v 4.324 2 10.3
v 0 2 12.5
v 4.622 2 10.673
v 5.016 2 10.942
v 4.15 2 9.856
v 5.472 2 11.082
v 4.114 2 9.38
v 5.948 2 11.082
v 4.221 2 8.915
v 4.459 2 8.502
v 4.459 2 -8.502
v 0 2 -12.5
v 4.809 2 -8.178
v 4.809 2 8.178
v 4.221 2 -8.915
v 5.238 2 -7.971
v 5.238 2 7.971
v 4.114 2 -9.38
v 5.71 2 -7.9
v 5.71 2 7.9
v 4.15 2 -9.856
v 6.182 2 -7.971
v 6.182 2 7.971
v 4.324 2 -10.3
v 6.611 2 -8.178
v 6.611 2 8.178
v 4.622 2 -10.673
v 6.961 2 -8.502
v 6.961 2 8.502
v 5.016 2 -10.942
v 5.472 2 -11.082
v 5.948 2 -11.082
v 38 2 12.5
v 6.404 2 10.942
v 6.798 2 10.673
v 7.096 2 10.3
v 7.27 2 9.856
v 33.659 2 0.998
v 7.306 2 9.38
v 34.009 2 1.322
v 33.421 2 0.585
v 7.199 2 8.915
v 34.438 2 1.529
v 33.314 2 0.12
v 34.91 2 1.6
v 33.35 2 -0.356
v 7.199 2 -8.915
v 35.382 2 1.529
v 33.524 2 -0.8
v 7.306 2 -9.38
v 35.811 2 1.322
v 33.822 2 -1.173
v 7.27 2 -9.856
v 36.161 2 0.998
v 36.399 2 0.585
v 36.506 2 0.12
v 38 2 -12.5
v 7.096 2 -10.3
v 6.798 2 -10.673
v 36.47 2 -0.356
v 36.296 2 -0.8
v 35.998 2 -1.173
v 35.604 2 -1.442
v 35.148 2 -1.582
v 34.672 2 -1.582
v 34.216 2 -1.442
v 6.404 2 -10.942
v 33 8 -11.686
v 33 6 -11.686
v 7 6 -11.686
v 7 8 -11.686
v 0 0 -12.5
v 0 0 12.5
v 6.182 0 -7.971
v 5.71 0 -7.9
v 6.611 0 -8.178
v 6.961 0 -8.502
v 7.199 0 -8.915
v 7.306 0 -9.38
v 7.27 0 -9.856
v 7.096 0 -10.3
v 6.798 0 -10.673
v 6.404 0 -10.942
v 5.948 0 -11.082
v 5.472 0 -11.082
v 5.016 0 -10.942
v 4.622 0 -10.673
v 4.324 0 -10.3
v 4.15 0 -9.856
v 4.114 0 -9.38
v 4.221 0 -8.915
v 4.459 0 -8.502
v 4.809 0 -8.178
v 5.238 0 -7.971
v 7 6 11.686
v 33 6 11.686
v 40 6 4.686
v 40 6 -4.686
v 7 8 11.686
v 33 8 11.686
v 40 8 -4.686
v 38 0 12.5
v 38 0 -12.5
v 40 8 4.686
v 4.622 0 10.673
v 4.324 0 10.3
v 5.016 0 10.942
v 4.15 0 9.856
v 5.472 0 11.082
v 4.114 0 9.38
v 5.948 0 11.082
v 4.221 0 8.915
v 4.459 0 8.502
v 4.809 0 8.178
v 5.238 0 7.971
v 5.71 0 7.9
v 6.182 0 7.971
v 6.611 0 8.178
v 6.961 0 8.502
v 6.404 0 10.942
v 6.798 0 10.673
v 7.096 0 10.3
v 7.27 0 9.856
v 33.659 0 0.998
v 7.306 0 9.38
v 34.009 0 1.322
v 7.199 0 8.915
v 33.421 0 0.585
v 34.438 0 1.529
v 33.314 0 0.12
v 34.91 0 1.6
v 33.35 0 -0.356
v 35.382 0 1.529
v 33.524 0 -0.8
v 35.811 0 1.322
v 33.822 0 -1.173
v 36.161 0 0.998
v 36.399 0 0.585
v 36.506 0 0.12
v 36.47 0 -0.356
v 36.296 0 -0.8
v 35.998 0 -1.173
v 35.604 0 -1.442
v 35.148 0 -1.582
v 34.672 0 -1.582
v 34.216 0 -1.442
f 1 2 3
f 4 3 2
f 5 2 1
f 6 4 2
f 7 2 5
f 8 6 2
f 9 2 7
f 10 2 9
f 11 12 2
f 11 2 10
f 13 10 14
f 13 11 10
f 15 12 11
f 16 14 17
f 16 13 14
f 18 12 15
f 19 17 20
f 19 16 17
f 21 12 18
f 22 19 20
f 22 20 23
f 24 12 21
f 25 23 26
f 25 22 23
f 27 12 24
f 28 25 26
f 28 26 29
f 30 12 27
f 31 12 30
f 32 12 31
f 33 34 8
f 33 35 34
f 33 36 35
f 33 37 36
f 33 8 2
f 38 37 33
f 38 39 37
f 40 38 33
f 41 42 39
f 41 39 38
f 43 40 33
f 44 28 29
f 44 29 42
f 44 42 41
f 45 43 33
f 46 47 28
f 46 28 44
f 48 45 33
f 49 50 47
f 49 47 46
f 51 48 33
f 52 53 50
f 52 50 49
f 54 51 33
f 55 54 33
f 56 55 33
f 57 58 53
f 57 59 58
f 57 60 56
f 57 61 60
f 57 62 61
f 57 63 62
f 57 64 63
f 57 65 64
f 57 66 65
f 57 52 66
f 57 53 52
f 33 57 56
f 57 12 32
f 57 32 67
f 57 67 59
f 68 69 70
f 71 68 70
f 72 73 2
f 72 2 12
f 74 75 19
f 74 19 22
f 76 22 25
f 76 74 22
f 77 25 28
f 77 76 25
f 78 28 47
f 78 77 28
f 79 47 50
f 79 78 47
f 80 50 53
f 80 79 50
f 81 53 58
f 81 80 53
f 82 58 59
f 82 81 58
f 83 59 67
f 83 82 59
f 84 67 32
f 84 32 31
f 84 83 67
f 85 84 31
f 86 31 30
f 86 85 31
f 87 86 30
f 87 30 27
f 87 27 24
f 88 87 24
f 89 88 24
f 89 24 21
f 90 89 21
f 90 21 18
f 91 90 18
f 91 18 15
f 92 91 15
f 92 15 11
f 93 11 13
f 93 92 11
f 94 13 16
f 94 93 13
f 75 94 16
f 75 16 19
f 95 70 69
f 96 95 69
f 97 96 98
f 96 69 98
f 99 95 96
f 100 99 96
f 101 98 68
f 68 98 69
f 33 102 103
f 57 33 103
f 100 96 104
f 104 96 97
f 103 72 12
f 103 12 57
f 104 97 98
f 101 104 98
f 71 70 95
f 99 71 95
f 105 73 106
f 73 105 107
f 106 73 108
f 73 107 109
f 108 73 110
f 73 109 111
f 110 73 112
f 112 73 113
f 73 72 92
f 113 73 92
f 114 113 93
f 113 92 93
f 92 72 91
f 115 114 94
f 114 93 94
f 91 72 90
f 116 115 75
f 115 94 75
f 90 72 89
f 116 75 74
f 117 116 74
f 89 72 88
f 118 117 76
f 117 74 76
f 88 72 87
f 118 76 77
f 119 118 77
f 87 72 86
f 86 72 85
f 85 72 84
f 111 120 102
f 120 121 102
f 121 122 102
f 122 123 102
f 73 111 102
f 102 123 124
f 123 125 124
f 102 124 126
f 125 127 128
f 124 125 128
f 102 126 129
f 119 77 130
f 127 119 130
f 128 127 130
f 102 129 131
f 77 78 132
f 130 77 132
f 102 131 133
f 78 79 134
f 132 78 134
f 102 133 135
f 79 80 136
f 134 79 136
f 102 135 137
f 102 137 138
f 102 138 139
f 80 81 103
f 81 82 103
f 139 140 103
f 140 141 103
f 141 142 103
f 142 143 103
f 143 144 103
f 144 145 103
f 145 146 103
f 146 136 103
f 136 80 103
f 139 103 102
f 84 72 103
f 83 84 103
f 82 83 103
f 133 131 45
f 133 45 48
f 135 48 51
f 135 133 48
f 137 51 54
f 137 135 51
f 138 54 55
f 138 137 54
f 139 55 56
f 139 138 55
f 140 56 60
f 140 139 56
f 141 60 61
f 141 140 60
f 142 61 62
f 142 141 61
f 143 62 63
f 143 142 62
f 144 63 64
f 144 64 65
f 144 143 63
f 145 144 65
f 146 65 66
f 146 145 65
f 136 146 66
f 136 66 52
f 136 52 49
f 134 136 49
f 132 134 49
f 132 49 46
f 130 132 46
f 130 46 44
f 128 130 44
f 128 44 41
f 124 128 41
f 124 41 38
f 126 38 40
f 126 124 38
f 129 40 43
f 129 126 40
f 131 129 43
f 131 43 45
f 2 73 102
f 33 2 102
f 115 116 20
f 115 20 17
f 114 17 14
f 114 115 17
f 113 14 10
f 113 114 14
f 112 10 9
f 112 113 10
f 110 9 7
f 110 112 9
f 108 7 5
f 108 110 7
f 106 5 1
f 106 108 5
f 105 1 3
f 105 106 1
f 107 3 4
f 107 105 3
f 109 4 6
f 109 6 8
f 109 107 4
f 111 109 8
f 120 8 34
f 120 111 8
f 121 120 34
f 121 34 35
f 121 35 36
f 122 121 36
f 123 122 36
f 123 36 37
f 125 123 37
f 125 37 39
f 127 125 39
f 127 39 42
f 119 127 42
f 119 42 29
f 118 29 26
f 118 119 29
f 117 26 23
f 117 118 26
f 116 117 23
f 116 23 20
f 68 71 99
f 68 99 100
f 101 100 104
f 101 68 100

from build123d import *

# Parameters (mm, degrees)
SKETCH1_W           = 38
SKETCH1_H           = 25
SKETCH1_R           = 1.6
BOSS_EXTRUDE1_DEPTH = 2
BOSS_EXTRUDE2_START = 6
BOSS_EXTRUDE2_DEPTH = 2


with BuildPart() as part:
    # Sketch1 → Boss-Extrude1 (new body)
    with BuildSketch(Plane(origin=(0, 0, 0), x_dir=(1, 0, 0), z_dir=(0, 1, 0))):
        with Locations((19, 0)):
            Rectangle(SKETCH1_W, SKETCH1_H)
        with Locations(Location((5.71, 9.5, 0), (0, 0, 270))):
            Circle(SKETCH1_R, mode=Mode.SUBTRACT)
        with Locations(Location((5.71, -9.5, 0), (0, 0, 90))):
            Circle(SKETCH1_R, mode=Mode.SUBTRACT)
        with Locations(Location((34.91, 0, 0), (0, 0, 270))):
            Circle(SKETCH1_R, mode=Mode.SUBTRACT)
    extrude(amount=BOSS_EXTRUDE1_DEPTH)


with BuildPart() as body_2:
    # Sketch2 → Boss-Extrude2 (new body)
    with BuildSketch(Plane(origin=(0, 0, 0), x_dir=(1, 0, 0), z_dir=(0, 1, 0)).offset(BOSS_EXTRUDE2_START)):
        Polygon((33, -11.686418873), (40, -4.686418873), (40, 4.686418873), (33, 11.686418873), (7, 11.686418873), (7, -11.686418873), align=None)
    extrude(amount=BOSS_EXTRUDE2_DEPTH)


solid = Compound([part.part, body_2.part])
